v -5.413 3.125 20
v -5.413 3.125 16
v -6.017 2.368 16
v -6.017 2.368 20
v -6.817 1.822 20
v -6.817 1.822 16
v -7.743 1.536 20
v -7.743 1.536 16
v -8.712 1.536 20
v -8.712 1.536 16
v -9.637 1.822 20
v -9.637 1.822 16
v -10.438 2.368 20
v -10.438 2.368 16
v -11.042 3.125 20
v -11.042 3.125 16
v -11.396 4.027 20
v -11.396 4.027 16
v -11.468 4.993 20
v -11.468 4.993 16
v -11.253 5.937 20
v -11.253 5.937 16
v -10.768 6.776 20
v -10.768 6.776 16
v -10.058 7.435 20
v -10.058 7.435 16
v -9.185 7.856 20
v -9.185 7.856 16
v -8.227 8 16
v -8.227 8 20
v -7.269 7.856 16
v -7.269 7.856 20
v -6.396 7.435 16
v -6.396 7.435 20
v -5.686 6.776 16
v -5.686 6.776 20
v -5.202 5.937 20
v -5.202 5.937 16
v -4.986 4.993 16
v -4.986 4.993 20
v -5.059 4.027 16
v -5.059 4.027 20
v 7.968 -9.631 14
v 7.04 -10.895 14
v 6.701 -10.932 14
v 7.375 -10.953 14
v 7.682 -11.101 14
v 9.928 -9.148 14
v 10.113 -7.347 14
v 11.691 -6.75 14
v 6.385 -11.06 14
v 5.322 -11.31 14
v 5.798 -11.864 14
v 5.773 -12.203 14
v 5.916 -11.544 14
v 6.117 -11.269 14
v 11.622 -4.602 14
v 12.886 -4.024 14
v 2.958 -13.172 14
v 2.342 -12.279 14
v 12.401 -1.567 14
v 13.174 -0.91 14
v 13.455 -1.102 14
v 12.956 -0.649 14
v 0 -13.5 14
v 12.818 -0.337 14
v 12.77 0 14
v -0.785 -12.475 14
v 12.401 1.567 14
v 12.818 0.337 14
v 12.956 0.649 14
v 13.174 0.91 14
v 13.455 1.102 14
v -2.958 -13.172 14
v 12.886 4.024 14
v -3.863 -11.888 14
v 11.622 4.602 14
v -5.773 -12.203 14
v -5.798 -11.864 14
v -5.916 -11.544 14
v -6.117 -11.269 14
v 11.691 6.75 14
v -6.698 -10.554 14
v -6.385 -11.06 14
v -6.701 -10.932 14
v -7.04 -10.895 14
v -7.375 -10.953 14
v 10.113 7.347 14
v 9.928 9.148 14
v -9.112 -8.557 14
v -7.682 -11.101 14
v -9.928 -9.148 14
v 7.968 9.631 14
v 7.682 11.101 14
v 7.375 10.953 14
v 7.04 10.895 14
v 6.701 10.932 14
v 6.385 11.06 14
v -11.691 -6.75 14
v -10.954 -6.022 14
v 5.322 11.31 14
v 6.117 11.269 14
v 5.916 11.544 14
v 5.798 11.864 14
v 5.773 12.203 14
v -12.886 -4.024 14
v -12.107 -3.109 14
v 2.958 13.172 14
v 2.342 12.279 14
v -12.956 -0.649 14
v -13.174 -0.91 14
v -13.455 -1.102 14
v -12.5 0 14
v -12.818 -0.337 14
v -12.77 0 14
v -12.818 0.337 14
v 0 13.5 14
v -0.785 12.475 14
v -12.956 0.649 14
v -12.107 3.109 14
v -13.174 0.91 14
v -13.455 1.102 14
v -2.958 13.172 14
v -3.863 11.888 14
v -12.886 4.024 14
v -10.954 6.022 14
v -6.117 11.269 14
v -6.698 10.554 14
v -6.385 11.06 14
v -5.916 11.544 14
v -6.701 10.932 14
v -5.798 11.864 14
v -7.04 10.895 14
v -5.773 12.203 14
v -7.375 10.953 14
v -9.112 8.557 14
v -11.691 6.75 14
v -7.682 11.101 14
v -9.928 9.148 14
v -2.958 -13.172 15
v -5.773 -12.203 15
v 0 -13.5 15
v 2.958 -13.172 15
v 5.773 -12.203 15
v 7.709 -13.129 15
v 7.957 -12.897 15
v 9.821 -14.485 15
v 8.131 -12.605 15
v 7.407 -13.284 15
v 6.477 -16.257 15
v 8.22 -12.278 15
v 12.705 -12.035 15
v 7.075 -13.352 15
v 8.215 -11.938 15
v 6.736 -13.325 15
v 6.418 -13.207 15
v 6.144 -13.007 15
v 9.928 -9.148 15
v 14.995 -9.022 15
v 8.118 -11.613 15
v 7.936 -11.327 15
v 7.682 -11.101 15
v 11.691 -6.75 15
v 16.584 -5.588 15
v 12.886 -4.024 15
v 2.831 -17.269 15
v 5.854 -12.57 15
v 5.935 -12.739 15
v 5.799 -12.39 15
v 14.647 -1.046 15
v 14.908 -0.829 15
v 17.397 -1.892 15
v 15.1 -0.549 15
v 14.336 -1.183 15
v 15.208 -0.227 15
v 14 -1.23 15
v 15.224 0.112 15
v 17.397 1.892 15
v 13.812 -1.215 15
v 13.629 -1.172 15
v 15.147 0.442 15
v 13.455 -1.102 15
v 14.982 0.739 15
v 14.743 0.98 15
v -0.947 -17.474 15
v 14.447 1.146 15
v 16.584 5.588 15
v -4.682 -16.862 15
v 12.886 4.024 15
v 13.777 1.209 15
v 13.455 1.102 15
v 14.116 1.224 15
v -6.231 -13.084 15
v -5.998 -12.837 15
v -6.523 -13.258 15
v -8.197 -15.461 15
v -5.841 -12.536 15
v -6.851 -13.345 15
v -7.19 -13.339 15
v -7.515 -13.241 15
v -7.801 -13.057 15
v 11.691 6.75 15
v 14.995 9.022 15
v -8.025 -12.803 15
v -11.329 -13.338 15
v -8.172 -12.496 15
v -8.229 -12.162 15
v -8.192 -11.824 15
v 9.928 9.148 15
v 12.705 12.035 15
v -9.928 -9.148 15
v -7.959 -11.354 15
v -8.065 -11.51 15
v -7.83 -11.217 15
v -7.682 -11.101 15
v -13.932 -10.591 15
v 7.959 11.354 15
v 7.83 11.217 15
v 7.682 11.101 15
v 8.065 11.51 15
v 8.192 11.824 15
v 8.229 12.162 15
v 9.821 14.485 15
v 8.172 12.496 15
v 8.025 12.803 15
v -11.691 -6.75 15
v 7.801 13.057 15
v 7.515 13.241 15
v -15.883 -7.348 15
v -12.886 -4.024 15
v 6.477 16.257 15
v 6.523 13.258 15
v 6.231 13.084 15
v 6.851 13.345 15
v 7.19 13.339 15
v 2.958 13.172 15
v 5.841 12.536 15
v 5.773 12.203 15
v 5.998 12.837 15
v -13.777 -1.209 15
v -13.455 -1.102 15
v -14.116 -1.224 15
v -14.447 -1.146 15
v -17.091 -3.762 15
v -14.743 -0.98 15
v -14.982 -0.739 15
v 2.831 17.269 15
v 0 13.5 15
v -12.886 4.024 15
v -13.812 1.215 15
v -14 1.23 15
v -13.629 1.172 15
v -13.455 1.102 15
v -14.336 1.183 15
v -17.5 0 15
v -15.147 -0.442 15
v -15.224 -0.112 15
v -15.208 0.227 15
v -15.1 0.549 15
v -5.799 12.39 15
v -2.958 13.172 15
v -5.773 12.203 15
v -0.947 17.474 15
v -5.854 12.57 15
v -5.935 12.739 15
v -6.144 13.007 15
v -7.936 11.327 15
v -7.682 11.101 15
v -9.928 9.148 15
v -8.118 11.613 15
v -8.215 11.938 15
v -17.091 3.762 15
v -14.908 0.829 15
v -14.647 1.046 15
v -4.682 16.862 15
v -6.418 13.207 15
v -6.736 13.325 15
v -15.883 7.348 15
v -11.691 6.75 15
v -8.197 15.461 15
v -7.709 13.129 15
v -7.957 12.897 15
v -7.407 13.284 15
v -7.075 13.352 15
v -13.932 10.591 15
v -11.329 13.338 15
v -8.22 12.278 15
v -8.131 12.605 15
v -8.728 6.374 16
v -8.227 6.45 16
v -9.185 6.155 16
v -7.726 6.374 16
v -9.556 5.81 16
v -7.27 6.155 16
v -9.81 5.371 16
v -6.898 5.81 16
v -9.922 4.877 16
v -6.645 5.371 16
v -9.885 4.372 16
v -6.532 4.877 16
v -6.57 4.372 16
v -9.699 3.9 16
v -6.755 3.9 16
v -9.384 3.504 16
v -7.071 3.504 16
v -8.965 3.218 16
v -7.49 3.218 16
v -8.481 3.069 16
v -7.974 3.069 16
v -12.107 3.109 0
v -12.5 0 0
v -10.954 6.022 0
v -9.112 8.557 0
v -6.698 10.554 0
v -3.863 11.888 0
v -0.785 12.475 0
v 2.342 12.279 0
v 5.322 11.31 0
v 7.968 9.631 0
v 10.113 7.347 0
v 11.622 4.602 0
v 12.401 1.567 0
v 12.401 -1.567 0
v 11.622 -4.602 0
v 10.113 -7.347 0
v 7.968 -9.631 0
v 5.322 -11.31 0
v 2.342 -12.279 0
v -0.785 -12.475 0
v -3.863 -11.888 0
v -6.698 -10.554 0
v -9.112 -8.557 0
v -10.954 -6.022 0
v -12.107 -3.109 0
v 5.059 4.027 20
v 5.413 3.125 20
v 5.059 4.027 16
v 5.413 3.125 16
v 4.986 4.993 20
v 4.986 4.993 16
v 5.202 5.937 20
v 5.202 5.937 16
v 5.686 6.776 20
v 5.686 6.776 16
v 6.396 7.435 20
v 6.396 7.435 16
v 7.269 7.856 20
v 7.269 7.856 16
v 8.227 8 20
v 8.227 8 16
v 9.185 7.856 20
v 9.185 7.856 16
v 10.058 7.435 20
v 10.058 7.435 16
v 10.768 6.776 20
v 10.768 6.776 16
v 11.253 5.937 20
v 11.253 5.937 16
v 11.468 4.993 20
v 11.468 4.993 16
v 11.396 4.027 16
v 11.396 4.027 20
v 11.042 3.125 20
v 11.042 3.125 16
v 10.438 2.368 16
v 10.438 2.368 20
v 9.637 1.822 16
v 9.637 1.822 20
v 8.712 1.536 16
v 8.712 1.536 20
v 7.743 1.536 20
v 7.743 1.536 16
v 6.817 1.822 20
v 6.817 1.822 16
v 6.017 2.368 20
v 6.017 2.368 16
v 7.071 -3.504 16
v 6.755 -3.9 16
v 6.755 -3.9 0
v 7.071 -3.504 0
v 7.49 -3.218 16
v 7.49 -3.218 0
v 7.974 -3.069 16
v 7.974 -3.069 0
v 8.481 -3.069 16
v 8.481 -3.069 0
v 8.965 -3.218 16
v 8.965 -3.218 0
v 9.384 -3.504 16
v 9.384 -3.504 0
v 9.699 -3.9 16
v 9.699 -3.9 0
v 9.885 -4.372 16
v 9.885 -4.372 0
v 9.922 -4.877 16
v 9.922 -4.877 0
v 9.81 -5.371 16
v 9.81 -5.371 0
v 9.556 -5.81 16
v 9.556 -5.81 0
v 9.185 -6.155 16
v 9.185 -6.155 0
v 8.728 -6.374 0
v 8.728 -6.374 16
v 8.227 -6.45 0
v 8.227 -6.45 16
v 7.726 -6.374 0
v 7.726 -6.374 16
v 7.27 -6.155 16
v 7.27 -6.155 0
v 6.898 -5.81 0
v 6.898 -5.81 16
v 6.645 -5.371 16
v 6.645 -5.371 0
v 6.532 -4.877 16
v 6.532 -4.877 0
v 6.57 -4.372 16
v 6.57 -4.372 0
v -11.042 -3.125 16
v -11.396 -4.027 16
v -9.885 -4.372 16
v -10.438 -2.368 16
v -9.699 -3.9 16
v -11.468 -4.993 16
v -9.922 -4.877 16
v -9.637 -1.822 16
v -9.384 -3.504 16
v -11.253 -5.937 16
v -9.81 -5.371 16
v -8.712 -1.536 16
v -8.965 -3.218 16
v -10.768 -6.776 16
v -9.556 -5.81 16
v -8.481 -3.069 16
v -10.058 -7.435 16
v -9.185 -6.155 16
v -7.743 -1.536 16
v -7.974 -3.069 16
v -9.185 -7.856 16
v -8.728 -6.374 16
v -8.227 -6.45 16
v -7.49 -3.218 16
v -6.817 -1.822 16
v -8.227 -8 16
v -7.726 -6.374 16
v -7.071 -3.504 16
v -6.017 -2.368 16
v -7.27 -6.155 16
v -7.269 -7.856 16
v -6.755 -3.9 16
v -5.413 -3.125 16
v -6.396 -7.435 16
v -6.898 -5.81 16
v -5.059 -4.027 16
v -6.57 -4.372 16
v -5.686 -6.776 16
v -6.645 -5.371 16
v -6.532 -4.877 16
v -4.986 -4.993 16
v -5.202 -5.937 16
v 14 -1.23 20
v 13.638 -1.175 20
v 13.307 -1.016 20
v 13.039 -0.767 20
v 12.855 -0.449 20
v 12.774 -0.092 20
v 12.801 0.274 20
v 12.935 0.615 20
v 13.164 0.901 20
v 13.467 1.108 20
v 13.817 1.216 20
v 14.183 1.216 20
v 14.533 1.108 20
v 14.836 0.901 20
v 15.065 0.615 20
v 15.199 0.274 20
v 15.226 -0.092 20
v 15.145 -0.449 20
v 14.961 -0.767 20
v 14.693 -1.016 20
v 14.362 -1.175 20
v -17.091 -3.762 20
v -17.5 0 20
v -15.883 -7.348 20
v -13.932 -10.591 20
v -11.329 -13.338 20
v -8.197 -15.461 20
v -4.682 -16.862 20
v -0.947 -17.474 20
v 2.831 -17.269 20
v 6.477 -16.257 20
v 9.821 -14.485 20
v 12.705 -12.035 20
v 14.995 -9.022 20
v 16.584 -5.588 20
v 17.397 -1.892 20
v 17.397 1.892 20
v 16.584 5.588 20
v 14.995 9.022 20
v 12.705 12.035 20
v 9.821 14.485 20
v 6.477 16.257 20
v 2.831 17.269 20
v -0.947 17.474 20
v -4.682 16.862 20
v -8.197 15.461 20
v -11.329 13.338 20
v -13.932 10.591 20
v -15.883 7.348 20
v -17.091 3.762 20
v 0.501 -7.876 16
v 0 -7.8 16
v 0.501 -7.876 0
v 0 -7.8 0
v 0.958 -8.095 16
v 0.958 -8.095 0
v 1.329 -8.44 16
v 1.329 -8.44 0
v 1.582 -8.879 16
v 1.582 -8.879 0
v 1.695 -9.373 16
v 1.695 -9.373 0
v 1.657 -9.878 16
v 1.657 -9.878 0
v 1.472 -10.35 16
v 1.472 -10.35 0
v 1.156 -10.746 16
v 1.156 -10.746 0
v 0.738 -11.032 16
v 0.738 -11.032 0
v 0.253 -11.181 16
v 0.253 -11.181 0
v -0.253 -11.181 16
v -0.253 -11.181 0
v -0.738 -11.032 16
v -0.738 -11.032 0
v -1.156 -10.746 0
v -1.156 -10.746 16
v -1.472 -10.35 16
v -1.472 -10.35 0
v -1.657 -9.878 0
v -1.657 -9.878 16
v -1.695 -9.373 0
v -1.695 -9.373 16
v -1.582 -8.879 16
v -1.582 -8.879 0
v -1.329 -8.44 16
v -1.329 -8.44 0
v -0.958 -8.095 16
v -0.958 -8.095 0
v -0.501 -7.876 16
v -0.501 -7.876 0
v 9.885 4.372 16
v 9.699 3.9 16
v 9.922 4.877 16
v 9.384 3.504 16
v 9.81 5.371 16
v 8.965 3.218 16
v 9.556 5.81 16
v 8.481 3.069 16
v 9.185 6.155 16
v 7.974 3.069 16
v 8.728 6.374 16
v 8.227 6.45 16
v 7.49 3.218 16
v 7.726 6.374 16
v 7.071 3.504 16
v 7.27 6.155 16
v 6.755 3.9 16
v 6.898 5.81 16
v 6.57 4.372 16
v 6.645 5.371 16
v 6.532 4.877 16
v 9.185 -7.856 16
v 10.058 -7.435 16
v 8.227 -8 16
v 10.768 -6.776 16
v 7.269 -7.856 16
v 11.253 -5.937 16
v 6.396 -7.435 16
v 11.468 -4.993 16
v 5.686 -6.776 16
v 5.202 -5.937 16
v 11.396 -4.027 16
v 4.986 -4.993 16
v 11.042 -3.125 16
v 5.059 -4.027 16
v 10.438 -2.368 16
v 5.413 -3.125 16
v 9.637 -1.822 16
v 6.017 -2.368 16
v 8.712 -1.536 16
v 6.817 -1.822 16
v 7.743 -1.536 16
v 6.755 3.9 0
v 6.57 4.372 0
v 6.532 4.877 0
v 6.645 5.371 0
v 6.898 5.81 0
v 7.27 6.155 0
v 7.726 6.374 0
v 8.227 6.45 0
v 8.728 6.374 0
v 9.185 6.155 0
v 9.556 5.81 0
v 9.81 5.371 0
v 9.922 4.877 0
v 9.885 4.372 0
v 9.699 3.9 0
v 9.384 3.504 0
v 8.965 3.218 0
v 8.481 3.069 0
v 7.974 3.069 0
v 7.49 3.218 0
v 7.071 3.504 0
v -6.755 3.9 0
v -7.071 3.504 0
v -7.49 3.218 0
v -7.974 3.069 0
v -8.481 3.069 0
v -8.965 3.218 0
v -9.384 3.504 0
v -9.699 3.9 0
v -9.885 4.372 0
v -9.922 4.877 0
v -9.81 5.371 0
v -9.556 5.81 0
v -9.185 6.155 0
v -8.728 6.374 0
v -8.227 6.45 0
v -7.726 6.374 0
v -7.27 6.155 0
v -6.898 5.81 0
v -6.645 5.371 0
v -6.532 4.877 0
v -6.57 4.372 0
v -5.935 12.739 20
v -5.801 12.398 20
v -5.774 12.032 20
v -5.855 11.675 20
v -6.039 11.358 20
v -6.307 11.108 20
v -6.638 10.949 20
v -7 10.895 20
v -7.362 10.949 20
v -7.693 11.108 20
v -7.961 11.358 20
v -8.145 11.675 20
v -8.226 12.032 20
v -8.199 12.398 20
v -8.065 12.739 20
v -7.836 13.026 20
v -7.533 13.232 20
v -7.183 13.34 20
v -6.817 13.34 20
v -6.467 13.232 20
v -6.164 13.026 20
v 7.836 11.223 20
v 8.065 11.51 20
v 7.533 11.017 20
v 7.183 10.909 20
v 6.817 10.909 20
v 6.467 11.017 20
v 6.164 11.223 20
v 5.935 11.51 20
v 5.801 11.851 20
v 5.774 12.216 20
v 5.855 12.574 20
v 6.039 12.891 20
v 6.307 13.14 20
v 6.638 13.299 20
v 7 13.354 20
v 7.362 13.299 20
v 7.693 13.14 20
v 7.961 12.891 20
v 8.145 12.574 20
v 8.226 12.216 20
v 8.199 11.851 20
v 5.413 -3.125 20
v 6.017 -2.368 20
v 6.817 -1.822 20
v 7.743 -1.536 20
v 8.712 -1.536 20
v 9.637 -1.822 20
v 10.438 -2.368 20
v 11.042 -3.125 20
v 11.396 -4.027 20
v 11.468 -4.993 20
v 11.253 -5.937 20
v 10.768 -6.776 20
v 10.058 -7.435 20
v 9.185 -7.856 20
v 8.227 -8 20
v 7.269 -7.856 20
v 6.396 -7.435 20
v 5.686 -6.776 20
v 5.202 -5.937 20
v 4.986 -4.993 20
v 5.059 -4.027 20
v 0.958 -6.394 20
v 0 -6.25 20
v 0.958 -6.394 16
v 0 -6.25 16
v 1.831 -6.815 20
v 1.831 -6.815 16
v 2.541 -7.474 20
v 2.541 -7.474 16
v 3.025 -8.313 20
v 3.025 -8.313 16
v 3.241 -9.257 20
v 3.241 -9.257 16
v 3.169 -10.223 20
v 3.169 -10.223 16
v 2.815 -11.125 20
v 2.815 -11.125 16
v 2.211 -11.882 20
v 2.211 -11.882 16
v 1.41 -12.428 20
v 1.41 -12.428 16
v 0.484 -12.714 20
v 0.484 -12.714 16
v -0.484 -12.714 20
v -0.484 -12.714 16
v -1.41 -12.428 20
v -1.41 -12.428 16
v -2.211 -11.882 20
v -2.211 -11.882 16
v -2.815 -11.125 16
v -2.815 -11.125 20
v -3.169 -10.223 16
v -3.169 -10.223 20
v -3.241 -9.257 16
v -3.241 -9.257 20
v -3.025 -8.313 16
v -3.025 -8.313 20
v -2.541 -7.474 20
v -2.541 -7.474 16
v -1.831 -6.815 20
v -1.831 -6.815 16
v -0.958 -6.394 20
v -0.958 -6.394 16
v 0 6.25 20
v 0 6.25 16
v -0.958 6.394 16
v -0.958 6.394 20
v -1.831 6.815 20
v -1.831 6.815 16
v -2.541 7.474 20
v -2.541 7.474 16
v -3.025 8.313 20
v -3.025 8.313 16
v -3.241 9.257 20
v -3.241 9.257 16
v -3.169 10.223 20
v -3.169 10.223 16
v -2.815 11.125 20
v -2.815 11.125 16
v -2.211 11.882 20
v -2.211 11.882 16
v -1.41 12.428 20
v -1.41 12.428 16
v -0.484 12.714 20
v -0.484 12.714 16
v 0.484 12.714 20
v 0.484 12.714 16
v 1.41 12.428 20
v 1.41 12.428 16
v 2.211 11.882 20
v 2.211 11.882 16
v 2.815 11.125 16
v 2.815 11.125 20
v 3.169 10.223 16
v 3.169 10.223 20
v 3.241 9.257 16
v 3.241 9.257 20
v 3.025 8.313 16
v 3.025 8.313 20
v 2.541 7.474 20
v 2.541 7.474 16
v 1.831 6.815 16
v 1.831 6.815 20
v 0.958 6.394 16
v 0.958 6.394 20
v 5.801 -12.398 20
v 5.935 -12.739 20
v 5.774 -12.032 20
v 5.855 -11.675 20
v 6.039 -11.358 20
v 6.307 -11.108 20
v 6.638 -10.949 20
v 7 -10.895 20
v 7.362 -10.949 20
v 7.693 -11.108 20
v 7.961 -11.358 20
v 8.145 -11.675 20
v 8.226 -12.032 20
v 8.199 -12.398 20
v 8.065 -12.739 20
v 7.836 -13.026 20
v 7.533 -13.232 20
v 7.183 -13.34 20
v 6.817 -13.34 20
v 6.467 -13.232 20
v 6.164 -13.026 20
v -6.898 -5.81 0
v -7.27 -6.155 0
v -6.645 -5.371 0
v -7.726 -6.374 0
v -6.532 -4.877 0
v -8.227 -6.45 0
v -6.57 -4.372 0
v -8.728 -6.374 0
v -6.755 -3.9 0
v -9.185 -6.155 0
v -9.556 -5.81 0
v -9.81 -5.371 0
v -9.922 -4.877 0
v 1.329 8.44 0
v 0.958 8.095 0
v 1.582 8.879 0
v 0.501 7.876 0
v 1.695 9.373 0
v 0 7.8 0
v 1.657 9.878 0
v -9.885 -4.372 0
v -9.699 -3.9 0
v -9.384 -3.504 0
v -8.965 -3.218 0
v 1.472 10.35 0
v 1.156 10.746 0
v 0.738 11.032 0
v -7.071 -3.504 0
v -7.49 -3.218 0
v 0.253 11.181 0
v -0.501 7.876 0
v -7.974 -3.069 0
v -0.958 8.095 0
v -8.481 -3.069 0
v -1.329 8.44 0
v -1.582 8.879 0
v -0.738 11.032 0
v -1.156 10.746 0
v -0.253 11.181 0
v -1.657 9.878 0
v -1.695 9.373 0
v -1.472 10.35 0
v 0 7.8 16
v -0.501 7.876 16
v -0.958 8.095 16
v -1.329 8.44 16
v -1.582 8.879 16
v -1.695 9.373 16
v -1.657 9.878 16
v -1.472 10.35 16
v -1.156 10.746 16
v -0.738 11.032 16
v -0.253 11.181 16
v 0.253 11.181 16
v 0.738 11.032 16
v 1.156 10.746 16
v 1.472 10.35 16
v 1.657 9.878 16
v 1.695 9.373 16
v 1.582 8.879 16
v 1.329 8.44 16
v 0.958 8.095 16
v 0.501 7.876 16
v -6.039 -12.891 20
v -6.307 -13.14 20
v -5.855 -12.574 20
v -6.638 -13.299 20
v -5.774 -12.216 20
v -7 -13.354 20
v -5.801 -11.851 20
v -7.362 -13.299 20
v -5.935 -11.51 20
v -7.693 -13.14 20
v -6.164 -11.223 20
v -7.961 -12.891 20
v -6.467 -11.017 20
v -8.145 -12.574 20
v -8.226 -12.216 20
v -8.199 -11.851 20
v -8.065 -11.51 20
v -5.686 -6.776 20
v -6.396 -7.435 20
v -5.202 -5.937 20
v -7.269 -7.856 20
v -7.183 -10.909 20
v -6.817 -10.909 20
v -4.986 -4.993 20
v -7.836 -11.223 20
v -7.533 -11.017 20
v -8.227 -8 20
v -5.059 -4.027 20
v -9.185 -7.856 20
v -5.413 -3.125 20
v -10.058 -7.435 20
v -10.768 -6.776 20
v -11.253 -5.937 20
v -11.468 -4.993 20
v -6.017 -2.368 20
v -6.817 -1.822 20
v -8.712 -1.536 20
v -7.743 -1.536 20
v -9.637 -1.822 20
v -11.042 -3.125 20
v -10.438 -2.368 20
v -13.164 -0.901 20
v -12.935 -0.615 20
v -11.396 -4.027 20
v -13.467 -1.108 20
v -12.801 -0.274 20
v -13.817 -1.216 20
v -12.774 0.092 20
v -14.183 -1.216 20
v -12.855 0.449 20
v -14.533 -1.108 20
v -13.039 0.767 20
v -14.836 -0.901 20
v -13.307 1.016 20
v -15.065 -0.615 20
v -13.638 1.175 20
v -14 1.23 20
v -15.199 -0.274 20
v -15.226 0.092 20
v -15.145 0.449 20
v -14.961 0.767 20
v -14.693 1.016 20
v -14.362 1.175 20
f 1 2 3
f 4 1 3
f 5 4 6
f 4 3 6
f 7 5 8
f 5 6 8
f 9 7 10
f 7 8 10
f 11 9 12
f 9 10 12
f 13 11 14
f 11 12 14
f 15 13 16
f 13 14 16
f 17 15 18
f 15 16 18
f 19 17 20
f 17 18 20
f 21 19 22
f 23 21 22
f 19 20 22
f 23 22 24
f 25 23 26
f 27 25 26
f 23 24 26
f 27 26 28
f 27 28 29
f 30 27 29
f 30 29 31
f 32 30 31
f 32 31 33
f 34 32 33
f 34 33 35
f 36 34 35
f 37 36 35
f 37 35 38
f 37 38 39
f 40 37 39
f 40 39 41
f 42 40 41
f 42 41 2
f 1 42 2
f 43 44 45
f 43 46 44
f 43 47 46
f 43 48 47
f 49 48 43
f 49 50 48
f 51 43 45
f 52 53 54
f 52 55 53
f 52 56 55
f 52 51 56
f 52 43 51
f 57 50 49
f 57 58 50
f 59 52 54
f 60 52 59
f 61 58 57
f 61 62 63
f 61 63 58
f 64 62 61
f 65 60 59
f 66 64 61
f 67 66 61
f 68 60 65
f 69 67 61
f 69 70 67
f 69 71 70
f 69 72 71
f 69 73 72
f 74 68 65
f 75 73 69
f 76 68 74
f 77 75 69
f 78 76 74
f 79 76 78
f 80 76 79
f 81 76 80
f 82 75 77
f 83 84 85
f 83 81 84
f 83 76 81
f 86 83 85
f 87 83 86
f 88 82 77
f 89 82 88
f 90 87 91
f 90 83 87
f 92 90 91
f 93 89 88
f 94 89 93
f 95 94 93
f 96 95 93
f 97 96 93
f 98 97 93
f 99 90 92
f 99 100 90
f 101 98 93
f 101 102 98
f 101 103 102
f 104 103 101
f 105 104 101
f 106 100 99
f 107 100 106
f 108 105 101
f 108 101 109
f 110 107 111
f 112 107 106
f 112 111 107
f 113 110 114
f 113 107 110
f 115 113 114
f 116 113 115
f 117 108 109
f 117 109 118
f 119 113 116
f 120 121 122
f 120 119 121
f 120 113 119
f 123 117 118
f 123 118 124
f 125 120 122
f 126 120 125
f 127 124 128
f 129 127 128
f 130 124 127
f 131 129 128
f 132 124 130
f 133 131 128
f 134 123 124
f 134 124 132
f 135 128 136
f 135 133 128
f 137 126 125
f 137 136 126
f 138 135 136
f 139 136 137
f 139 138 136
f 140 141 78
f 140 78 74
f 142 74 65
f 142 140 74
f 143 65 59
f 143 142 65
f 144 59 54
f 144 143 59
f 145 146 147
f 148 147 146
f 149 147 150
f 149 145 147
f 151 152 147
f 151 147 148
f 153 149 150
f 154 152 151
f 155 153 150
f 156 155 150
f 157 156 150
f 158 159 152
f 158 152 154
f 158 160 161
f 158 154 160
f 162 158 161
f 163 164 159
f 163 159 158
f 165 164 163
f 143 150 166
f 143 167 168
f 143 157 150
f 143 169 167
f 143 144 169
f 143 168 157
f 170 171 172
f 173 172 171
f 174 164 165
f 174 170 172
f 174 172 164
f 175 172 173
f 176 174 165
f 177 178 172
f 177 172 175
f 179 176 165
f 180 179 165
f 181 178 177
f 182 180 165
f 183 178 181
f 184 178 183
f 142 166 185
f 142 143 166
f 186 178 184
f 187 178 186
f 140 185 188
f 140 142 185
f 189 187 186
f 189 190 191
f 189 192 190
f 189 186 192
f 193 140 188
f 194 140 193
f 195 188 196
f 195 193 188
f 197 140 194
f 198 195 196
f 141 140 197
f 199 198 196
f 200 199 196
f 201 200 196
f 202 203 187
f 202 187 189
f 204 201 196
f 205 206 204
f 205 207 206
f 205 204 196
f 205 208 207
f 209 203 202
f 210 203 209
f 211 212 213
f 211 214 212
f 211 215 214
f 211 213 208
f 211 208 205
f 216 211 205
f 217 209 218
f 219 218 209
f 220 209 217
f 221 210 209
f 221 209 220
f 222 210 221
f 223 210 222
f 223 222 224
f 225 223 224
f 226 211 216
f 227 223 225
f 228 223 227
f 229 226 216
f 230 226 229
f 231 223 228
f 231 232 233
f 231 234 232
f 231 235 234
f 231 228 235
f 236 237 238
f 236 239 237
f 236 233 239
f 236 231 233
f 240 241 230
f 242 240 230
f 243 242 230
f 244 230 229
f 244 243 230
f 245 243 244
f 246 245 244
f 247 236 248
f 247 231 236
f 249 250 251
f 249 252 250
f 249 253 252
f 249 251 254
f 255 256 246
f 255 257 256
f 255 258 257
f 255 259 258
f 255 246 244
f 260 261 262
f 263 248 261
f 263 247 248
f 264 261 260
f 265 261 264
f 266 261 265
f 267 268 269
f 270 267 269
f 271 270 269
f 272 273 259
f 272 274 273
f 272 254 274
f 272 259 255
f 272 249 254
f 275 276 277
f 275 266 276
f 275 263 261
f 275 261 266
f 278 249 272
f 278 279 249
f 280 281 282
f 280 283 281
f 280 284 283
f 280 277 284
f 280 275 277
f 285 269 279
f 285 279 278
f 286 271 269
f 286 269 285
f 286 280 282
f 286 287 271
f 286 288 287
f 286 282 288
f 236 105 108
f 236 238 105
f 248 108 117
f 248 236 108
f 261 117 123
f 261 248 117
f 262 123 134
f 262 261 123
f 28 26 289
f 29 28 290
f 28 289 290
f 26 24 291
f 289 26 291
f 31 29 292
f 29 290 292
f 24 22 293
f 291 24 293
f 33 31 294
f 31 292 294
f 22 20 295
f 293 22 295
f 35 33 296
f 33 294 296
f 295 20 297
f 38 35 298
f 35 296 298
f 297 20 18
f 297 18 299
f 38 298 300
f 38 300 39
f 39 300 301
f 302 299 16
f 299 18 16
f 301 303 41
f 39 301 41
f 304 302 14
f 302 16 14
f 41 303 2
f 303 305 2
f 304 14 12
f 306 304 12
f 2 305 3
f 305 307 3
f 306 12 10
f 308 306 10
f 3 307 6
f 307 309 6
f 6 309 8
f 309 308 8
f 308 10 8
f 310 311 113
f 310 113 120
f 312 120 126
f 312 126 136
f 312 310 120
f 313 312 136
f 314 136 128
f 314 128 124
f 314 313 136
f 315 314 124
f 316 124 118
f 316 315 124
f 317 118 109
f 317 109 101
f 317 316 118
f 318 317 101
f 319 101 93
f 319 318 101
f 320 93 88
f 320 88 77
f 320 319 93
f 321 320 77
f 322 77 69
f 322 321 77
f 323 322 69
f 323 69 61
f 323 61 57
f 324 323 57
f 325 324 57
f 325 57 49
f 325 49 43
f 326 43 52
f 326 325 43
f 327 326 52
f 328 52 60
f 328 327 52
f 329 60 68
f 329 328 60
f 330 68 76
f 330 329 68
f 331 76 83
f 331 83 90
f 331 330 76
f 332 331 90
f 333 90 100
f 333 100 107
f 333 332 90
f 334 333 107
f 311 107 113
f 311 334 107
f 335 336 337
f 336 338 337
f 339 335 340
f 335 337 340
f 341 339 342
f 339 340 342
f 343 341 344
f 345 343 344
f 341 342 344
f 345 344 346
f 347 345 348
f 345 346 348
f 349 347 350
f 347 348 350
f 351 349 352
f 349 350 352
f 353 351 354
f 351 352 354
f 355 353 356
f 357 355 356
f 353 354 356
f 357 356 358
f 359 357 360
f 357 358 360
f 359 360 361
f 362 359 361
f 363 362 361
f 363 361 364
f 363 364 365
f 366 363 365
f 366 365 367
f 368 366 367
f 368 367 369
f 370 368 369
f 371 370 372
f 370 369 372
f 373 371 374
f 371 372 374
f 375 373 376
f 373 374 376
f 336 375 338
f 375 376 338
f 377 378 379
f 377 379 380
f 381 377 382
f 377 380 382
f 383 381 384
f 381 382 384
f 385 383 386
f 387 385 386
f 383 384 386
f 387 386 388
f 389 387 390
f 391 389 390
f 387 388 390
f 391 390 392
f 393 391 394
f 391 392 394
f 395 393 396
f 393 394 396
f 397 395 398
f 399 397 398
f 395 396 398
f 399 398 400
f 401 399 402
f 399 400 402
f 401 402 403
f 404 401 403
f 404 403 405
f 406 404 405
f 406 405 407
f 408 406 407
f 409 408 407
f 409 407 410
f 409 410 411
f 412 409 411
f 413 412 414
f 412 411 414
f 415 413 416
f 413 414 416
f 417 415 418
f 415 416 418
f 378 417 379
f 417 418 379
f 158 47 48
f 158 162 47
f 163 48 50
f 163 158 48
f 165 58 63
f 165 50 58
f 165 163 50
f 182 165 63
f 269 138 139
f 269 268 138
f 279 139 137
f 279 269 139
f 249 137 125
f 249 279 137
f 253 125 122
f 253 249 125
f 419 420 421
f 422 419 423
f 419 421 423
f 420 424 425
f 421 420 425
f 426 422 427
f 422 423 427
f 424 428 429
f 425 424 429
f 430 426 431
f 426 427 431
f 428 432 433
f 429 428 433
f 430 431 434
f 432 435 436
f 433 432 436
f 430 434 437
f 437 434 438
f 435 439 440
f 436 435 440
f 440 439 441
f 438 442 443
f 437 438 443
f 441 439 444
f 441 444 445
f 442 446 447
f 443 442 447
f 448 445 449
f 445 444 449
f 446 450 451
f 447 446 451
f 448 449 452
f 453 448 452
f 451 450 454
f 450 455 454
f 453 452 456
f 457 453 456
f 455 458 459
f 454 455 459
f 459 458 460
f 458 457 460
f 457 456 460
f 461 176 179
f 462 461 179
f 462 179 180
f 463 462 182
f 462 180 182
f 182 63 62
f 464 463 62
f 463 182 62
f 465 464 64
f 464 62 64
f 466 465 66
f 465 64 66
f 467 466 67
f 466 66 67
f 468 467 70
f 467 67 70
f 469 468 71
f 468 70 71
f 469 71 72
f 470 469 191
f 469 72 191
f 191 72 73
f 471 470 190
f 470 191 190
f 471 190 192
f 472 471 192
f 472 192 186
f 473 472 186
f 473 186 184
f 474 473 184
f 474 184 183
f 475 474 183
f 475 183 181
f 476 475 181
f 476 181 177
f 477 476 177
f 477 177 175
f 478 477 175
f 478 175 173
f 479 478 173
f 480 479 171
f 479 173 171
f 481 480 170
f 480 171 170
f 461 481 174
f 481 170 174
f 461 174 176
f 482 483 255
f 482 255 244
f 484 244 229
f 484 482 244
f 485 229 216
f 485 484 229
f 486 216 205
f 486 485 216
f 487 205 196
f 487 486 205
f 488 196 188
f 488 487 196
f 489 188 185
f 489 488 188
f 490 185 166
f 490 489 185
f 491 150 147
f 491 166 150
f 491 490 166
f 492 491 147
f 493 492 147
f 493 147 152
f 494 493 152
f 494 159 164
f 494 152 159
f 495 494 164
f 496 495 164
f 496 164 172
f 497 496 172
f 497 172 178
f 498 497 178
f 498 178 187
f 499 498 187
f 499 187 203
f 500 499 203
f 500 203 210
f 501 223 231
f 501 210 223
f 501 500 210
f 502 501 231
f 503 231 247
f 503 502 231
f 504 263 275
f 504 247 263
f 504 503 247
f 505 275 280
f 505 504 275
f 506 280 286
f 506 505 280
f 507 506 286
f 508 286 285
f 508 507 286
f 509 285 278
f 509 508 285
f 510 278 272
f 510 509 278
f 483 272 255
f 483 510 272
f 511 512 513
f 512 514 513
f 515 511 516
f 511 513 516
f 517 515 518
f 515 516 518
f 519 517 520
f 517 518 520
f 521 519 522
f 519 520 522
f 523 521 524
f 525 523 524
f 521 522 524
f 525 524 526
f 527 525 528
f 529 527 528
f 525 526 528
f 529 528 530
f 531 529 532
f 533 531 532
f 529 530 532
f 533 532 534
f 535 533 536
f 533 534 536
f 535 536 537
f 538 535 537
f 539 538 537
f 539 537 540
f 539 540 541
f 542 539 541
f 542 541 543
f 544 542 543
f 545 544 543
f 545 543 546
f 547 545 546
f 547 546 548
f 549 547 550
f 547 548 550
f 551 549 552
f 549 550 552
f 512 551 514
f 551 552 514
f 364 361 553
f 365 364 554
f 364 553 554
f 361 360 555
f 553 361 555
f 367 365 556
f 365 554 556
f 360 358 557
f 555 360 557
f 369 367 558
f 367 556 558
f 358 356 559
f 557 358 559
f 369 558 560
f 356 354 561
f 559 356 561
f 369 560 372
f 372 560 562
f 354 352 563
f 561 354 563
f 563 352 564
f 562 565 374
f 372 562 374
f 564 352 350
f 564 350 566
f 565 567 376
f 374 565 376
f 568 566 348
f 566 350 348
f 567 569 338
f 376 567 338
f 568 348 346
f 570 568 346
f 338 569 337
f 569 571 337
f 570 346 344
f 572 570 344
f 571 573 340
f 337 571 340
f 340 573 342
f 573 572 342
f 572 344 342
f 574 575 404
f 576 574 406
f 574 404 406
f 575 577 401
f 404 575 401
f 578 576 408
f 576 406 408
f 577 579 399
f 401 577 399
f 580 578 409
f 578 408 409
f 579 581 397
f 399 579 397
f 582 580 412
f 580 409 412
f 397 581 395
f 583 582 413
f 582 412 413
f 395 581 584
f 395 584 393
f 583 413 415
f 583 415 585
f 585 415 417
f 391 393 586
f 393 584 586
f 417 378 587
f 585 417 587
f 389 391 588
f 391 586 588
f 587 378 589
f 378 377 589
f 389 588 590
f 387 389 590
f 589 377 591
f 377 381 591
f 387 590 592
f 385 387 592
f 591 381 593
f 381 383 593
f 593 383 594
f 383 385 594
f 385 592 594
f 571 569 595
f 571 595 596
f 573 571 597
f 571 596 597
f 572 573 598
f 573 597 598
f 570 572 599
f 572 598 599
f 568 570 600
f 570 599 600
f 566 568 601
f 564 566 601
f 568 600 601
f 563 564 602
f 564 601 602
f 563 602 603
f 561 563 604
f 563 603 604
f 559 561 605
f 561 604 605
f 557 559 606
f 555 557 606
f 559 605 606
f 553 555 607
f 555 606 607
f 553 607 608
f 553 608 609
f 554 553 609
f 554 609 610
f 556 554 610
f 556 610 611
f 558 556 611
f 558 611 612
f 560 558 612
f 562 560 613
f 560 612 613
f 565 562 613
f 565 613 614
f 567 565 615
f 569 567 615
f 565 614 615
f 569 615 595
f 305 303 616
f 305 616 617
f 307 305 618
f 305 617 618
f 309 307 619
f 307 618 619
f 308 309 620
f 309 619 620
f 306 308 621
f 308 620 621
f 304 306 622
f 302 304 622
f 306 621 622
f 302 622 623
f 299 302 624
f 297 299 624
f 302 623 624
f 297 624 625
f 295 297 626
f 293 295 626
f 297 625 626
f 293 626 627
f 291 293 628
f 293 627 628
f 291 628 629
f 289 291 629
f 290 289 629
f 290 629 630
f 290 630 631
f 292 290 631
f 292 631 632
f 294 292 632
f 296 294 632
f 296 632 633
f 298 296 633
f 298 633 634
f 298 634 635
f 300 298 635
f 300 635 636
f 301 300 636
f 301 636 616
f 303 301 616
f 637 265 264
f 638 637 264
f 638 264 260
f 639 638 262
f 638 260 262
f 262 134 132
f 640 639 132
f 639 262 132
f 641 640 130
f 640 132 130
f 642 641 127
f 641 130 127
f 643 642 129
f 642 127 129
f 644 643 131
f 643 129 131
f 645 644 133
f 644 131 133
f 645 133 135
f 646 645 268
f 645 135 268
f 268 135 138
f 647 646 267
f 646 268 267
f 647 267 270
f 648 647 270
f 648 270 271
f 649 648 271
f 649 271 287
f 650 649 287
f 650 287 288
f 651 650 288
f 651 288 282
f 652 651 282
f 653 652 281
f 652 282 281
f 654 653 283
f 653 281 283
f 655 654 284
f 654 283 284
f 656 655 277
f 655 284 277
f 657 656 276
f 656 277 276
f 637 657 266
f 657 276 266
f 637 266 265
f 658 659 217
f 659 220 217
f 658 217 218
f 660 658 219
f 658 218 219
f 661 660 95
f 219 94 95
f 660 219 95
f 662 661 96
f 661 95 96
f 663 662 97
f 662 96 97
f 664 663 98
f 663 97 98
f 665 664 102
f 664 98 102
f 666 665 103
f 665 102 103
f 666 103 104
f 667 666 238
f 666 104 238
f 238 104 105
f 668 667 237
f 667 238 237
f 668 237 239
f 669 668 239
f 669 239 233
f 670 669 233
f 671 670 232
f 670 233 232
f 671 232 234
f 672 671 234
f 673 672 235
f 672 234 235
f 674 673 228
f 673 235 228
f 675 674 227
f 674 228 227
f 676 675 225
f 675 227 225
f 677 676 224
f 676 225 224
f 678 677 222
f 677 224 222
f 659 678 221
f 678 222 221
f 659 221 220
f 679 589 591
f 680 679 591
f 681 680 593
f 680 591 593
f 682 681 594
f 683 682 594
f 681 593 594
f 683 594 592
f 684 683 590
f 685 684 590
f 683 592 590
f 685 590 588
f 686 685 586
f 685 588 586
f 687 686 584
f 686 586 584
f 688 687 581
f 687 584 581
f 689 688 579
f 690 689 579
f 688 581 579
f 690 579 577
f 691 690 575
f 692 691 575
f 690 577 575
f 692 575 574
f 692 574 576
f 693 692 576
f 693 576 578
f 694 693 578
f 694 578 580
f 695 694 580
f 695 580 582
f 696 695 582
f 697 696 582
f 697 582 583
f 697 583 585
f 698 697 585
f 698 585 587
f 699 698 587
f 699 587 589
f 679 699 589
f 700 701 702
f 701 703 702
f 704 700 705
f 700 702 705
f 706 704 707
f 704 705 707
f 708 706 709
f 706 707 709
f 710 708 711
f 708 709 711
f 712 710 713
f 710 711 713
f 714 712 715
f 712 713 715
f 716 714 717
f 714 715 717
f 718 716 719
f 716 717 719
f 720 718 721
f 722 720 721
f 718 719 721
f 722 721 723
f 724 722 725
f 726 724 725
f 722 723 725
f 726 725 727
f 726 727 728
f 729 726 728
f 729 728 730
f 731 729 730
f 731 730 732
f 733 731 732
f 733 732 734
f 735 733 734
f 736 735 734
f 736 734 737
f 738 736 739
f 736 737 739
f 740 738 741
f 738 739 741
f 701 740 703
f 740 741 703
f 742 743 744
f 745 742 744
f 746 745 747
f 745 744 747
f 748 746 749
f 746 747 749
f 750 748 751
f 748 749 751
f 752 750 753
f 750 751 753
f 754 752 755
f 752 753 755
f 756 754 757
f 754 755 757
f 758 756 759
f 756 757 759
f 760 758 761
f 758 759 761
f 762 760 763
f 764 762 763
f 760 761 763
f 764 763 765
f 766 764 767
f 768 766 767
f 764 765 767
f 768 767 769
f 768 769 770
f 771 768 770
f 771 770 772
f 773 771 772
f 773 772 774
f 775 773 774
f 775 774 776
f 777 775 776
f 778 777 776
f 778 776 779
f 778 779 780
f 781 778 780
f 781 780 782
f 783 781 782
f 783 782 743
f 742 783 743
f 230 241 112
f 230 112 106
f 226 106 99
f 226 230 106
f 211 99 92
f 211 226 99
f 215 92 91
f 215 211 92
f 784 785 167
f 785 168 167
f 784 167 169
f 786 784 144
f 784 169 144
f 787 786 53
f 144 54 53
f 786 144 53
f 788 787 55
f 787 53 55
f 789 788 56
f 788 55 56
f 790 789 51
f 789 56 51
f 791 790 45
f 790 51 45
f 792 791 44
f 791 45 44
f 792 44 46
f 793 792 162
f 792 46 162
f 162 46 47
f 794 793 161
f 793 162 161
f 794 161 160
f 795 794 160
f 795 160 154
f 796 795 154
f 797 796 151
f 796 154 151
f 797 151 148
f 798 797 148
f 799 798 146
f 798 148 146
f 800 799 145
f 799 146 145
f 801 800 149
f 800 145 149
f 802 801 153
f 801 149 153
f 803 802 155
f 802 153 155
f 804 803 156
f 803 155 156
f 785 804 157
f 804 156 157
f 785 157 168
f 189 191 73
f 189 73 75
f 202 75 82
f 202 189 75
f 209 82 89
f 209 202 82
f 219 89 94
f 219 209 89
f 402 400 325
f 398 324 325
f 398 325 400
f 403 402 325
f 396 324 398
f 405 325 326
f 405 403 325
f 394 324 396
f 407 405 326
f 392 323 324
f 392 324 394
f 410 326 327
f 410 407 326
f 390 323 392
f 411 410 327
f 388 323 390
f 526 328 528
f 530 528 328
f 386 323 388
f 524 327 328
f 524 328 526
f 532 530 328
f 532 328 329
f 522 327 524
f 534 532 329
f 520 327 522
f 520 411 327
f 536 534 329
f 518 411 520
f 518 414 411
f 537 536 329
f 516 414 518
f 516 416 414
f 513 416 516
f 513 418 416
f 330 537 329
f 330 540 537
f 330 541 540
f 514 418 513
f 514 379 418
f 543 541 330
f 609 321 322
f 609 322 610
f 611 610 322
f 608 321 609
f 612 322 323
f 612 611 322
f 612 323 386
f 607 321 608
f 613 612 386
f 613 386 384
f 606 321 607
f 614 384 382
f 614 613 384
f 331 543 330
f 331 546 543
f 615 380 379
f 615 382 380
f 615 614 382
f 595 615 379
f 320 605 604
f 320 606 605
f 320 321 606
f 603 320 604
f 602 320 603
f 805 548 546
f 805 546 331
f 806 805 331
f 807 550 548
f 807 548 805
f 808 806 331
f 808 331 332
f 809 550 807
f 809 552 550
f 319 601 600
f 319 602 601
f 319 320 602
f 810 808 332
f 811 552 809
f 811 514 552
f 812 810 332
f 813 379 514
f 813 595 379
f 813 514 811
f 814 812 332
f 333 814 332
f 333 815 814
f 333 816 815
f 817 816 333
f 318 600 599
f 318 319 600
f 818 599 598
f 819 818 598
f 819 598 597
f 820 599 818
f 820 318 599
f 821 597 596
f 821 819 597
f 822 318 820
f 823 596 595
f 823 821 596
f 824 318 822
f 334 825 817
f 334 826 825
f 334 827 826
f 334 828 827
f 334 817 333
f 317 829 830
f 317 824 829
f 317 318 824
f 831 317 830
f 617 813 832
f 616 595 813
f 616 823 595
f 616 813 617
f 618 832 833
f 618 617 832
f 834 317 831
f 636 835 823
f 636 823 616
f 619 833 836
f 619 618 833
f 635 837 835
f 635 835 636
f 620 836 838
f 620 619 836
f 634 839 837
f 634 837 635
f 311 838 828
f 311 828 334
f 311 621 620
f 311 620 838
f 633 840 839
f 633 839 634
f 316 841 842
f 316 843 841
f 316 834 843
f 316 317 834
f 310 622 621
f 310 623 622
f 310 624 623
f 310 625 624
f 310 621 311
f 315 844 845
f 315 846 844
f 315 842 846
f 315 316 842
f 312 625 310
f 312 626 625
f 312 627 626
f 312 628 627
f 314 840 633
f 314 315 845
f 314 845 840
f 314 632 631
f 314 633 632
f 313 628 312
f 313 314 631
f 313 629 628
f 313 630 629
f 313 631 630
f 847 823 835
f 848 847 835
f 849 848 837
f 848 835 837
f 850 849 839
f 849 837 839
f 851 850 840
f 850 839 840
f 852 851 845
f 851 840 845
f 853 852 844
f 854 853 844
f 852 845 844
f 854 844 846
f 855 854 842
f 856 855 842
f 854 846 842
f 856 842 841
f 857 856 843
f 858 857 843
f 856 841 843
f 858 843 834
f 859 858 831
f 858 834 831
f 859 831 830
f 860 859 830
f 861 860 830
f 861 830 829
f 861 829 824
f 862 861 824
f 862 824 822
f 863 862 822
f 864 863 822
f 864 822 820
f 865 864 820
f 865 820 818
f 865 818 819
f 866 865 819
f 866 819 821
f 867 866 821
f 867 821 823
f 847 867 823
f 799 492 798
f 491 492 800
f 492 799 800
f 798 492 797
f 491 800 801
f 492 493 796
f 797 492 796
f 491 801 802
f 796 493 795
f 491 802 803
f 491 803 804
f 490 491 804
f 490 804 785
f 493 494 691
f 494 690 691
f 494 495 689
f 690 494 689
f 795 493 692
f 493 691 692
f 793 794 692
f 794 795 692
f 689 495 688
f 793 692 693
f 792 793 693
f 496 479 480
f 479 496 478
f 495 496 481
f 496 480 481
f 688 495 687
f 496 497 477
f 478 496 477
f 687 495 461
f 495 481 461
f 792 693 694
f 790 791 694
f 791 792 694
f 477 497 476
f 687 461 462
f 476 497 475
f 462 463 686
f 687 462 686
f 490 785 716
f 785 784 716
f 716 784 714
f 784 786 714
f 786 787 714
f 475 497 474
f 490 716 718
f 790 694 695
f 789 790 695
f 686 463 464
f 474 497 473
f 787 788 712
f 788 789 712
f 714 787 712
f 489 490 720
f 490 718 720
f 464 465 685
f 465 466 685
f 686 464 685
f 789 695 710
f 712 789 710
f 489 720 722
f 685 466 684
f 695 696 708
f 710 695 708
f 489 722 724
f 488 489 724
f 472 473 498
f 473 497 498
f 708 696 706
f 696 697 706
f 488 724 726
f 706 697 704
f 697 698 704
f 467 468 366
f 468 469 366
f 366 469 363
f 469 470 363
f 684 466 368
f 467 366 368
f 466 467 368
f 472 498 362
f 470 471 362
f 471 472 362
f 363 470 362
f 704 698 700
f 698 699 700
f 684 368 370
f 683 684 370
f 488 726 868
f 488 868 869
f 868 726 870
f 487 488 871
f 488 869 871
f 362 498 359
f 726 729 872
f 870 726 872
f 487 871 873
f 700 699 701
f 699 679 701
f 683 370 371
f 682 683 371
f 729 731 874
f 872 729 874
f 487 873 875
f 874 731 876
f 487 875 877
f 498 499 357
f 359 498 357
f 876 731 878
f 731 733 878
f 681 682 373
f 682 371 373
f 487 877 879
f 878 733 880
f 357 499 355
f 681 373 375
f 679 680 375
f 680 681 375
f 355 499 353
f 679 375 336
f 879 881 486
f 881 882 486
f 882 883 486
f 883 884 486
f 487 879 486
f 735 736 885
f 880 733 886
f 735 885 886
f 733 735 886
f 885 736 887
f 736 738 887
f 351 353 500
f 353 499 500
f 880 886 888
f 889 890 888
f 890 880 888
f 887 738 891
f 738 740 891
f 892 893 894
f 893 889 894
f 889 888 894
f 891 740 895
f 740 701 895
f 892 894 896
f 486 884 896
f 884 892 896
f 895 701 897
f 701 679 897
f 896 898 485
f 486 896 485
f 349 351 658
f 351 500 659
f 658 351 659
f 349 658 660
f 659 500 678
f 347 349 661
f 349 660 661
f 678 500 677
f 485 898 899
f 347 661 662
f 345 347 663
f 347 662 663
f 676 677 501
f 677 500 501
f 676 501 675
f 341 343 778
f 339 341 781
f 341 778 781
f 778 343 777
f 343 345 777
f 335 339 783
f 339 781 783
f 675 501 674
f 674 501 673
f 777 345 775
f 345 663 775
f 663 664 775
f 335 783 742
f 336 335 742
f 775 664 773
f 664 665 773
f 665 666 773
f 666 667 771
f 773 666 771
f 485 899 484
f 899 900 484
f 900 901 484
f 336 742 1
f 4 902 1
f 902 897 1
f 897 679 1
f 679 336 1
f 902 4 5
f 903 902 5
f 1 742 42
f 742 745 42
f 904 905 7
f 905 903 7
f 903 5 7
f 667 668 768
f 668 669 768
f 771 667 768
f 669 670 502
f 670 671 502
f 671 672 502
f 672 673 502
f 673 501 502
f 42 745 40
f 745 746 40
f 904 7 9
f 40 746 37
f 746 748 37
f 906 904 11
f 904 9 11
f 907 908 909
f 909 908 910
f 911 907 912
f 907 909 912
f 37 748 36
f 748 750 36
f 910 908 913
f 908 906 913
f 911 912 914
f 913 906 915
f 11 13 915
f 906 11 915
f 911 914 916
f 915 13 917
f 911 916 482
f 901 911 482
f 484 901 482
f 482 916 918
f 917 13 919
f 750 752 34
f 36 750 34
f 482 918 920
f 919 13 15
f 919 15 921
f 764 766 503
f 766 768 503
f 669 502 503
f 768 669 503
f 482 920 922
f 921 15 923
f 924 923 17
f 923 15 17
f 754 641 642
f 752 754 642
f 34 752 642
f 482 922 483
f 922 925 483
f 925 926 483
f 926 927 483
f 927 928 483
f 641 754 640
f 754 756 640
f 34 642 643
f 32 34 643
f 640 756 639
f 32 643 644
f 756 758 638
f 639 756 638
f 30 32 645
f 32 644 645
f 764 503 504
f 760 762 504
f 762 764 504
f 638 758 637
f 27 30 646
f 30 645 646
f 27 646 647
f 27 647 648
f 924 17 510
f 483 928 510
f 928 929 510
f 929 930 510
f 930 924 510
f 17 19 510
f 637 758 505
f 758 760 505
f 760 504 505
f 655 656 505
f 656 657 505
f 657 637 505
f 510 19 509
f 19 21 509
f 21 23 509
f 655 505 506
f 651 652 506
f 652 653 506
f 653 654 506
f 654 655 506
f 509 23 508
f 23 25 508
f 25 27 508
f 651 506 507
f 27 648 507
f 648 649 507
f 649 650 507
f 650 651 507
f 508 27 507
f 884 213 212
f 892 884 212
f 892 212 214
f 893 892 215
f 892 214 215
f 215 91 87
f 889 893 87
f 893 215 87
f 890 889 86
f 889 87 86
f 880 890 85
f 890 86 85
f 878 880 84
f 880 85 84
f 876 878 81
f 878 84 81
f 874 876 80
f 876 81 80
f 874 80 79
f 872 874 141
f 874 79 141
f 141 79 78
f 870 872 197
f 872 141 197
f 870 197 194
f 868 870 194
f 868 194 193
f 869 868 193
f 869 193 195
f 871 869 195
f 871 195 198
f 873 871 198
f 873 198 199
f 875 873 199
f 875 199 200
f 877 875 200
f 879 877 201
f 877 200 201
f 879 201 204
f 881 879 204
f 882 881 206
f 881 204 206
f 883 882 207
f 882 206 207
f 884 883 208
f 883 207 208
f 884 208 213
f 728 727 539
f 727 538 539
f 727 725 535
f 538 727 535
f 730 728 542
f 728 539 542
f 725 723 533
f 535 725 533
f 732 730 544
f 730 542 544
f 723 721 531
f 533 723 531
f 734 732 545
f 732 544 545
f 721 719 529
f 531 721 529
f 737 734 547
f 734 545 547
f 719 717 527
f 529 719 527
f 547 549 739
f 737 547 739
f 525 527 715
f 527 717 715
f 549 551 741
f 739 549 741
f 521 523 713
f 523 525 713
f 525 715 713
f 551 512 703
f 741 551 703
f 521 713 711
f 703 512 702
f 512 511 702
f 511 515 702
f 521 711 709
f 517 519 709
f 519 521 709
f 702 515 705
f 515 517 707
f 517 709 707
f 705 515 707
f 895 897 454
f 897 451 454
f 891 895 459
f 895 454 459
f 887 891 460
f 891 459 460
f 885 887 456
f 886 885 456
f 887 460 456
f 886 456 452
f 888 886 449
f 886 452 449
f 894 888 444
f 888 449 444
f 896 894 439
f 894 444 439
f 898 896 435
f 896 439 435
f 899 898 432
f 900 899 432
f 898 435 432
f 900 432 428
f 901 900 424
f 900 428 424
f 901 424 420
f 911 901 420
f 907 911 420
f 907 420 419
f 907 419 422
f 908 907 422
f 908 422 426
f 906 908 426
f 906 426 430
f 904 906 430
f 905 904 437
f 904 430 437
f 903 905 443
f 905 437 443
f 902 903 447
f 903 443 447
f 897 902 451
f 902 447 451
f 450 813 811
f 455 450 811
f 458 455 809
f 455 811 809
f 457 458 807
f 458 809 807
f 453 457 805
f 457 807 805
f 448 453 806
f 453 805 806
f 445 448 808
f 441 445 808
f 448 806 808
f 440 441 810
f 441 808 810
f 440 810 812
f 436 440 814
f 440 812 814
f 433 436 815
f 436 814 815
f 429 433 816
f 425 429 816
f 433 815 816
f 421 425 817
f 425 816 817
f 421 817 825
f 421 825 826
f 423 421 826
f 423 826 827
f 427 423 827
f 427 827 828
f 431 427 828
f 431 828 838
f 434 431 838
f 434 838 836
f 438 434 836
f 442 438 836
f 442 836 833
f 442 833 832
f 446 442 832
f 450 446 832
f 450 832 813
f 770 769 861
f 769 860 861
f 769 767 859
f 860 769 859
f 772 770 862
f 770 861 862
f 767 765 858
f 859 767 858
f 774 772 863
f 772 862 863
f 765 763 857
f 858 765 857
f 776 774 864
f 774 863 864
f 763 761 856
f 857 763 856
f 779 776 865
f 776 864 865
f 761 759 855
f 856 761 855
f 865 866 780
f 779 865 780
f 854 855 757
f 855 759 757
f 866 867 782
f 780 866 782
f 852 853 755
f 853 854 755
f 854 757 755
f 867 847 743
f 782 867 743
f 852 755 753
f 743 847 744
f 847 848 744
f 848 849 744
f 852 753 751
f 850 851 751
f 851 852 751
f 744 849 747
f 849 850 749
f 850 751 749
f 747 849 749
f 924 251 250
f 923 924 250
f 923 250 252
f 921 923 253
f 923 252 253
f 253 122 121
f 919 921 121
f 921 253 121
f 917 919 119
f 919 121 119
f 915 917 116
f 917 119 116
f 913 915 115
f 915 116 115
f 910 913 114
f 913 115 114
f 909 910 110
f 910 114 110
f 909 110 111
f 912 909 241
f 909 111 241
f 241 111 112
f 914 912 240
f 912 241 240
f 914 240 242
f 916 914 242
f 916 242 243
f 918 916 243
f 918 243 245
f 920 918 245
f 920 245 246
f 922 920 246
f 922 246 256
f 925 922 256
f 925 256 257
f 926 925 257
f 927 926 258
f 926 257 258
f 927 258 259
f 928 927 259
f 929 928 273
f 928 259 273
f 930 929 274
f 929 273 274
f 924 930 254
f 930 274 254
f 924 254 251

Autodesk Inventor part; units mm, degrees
ref_plane "YZ Plane" through (0, 0, 0) normal (1, 0, 0) x (0, 1, 0)
ref_plane "XZ Plane" through (0, 0, 0) normal (0, 1, 0) x (-1, 0, 0)
ref_plane "XY Plane" through (0, 0, 0) normal (0, 0, 1) x (1, 0, 0)
sketch "Sketch1" plane through (0, 0, 0) normal (0, 1, 0) x (-1, 0, 0)
  line L0 (13.5, 14) -> (13.5, 15)
  line L1 (13.5, 15) -> (17.5, 15)
  line L2 (17.5, 15) -> (17.5, 20)
  line L3 (17.5, 20) -> (0, 20)
  line L4 (0, 20) -> (0, 0)
  line L5 (13.5, 14) -> (12.5, 14)
  line L6 (12.5, 14) -> (12.5, 0)
  line L7 (12.5, 0) -> (0, 0)
  dimension "d1" = 27
  dimension "d2" = 35
  dimension "d3" = 1
  dimension "d4" = 5
  dimension "d28" = 25
  dimension "d29" = 14
revolve "Revolution1" add sketch "Sketch1" angle 360 about axis through (0, 0, 20) along (0, 0, -1)
sketch "Sketch2" plane through (0, 0, 20) normal (0, 0, 1) x (1, 0, 0)
  point P0 (0, 0)
  point P1 (0, 9.5)
  dimension "d6" = 9.5
hole "Hole1" at (0, 9.5, 20) direction (0, 0, -1) diameter 3.4 end through all counterbore diameter 6.5 counterbore depth 4 clearance for "Socket Head Cap Screw DIN EN ISO 4762" size "M3" standard "DIN"
pattern_circular "Circular Pattern1" count 6 over 360 about axis through (0, 0, -10) along (0, 0, -1) of "Hole1"
sketch "Sketch3" plane through (0, 0, 20) normal (0, 0, 1) x (1, 0, 0)
  point P0 (0, 0)
  point P1 (14, 0)
  dimension "d17" = 14
hole "Hole2" at (14, 0, 20) direction (0, 0, -1) diameter 2.459 end through all thread size "M3x0.5" class "6H" standard "ISO Metric profile"
pattern_circular "Circular Pattern2" count 6 over 360 about axis through (0, 0, -10) along (0, 0, 1) of "Hole2"
equation "\"d28\" = bearing_61705_inner"
equation "\"bearing_61807_inner\" = 35"
equation "\"bearing_61807_outer\" = 47.1"
equation "\"bearing_61814_outer\" = 90.1"
equation "\"bearing_61705_outer\" = 32.1"
equation "\"bearing_61705_inner\" = 25"
equation "\"M3_adjustable\" = 3.2"
equation "\"bearing_606_outer\" = 17.1"
equation "\"gearbox_35_outer\" = 32.3"
properties part number "405-output disk"
